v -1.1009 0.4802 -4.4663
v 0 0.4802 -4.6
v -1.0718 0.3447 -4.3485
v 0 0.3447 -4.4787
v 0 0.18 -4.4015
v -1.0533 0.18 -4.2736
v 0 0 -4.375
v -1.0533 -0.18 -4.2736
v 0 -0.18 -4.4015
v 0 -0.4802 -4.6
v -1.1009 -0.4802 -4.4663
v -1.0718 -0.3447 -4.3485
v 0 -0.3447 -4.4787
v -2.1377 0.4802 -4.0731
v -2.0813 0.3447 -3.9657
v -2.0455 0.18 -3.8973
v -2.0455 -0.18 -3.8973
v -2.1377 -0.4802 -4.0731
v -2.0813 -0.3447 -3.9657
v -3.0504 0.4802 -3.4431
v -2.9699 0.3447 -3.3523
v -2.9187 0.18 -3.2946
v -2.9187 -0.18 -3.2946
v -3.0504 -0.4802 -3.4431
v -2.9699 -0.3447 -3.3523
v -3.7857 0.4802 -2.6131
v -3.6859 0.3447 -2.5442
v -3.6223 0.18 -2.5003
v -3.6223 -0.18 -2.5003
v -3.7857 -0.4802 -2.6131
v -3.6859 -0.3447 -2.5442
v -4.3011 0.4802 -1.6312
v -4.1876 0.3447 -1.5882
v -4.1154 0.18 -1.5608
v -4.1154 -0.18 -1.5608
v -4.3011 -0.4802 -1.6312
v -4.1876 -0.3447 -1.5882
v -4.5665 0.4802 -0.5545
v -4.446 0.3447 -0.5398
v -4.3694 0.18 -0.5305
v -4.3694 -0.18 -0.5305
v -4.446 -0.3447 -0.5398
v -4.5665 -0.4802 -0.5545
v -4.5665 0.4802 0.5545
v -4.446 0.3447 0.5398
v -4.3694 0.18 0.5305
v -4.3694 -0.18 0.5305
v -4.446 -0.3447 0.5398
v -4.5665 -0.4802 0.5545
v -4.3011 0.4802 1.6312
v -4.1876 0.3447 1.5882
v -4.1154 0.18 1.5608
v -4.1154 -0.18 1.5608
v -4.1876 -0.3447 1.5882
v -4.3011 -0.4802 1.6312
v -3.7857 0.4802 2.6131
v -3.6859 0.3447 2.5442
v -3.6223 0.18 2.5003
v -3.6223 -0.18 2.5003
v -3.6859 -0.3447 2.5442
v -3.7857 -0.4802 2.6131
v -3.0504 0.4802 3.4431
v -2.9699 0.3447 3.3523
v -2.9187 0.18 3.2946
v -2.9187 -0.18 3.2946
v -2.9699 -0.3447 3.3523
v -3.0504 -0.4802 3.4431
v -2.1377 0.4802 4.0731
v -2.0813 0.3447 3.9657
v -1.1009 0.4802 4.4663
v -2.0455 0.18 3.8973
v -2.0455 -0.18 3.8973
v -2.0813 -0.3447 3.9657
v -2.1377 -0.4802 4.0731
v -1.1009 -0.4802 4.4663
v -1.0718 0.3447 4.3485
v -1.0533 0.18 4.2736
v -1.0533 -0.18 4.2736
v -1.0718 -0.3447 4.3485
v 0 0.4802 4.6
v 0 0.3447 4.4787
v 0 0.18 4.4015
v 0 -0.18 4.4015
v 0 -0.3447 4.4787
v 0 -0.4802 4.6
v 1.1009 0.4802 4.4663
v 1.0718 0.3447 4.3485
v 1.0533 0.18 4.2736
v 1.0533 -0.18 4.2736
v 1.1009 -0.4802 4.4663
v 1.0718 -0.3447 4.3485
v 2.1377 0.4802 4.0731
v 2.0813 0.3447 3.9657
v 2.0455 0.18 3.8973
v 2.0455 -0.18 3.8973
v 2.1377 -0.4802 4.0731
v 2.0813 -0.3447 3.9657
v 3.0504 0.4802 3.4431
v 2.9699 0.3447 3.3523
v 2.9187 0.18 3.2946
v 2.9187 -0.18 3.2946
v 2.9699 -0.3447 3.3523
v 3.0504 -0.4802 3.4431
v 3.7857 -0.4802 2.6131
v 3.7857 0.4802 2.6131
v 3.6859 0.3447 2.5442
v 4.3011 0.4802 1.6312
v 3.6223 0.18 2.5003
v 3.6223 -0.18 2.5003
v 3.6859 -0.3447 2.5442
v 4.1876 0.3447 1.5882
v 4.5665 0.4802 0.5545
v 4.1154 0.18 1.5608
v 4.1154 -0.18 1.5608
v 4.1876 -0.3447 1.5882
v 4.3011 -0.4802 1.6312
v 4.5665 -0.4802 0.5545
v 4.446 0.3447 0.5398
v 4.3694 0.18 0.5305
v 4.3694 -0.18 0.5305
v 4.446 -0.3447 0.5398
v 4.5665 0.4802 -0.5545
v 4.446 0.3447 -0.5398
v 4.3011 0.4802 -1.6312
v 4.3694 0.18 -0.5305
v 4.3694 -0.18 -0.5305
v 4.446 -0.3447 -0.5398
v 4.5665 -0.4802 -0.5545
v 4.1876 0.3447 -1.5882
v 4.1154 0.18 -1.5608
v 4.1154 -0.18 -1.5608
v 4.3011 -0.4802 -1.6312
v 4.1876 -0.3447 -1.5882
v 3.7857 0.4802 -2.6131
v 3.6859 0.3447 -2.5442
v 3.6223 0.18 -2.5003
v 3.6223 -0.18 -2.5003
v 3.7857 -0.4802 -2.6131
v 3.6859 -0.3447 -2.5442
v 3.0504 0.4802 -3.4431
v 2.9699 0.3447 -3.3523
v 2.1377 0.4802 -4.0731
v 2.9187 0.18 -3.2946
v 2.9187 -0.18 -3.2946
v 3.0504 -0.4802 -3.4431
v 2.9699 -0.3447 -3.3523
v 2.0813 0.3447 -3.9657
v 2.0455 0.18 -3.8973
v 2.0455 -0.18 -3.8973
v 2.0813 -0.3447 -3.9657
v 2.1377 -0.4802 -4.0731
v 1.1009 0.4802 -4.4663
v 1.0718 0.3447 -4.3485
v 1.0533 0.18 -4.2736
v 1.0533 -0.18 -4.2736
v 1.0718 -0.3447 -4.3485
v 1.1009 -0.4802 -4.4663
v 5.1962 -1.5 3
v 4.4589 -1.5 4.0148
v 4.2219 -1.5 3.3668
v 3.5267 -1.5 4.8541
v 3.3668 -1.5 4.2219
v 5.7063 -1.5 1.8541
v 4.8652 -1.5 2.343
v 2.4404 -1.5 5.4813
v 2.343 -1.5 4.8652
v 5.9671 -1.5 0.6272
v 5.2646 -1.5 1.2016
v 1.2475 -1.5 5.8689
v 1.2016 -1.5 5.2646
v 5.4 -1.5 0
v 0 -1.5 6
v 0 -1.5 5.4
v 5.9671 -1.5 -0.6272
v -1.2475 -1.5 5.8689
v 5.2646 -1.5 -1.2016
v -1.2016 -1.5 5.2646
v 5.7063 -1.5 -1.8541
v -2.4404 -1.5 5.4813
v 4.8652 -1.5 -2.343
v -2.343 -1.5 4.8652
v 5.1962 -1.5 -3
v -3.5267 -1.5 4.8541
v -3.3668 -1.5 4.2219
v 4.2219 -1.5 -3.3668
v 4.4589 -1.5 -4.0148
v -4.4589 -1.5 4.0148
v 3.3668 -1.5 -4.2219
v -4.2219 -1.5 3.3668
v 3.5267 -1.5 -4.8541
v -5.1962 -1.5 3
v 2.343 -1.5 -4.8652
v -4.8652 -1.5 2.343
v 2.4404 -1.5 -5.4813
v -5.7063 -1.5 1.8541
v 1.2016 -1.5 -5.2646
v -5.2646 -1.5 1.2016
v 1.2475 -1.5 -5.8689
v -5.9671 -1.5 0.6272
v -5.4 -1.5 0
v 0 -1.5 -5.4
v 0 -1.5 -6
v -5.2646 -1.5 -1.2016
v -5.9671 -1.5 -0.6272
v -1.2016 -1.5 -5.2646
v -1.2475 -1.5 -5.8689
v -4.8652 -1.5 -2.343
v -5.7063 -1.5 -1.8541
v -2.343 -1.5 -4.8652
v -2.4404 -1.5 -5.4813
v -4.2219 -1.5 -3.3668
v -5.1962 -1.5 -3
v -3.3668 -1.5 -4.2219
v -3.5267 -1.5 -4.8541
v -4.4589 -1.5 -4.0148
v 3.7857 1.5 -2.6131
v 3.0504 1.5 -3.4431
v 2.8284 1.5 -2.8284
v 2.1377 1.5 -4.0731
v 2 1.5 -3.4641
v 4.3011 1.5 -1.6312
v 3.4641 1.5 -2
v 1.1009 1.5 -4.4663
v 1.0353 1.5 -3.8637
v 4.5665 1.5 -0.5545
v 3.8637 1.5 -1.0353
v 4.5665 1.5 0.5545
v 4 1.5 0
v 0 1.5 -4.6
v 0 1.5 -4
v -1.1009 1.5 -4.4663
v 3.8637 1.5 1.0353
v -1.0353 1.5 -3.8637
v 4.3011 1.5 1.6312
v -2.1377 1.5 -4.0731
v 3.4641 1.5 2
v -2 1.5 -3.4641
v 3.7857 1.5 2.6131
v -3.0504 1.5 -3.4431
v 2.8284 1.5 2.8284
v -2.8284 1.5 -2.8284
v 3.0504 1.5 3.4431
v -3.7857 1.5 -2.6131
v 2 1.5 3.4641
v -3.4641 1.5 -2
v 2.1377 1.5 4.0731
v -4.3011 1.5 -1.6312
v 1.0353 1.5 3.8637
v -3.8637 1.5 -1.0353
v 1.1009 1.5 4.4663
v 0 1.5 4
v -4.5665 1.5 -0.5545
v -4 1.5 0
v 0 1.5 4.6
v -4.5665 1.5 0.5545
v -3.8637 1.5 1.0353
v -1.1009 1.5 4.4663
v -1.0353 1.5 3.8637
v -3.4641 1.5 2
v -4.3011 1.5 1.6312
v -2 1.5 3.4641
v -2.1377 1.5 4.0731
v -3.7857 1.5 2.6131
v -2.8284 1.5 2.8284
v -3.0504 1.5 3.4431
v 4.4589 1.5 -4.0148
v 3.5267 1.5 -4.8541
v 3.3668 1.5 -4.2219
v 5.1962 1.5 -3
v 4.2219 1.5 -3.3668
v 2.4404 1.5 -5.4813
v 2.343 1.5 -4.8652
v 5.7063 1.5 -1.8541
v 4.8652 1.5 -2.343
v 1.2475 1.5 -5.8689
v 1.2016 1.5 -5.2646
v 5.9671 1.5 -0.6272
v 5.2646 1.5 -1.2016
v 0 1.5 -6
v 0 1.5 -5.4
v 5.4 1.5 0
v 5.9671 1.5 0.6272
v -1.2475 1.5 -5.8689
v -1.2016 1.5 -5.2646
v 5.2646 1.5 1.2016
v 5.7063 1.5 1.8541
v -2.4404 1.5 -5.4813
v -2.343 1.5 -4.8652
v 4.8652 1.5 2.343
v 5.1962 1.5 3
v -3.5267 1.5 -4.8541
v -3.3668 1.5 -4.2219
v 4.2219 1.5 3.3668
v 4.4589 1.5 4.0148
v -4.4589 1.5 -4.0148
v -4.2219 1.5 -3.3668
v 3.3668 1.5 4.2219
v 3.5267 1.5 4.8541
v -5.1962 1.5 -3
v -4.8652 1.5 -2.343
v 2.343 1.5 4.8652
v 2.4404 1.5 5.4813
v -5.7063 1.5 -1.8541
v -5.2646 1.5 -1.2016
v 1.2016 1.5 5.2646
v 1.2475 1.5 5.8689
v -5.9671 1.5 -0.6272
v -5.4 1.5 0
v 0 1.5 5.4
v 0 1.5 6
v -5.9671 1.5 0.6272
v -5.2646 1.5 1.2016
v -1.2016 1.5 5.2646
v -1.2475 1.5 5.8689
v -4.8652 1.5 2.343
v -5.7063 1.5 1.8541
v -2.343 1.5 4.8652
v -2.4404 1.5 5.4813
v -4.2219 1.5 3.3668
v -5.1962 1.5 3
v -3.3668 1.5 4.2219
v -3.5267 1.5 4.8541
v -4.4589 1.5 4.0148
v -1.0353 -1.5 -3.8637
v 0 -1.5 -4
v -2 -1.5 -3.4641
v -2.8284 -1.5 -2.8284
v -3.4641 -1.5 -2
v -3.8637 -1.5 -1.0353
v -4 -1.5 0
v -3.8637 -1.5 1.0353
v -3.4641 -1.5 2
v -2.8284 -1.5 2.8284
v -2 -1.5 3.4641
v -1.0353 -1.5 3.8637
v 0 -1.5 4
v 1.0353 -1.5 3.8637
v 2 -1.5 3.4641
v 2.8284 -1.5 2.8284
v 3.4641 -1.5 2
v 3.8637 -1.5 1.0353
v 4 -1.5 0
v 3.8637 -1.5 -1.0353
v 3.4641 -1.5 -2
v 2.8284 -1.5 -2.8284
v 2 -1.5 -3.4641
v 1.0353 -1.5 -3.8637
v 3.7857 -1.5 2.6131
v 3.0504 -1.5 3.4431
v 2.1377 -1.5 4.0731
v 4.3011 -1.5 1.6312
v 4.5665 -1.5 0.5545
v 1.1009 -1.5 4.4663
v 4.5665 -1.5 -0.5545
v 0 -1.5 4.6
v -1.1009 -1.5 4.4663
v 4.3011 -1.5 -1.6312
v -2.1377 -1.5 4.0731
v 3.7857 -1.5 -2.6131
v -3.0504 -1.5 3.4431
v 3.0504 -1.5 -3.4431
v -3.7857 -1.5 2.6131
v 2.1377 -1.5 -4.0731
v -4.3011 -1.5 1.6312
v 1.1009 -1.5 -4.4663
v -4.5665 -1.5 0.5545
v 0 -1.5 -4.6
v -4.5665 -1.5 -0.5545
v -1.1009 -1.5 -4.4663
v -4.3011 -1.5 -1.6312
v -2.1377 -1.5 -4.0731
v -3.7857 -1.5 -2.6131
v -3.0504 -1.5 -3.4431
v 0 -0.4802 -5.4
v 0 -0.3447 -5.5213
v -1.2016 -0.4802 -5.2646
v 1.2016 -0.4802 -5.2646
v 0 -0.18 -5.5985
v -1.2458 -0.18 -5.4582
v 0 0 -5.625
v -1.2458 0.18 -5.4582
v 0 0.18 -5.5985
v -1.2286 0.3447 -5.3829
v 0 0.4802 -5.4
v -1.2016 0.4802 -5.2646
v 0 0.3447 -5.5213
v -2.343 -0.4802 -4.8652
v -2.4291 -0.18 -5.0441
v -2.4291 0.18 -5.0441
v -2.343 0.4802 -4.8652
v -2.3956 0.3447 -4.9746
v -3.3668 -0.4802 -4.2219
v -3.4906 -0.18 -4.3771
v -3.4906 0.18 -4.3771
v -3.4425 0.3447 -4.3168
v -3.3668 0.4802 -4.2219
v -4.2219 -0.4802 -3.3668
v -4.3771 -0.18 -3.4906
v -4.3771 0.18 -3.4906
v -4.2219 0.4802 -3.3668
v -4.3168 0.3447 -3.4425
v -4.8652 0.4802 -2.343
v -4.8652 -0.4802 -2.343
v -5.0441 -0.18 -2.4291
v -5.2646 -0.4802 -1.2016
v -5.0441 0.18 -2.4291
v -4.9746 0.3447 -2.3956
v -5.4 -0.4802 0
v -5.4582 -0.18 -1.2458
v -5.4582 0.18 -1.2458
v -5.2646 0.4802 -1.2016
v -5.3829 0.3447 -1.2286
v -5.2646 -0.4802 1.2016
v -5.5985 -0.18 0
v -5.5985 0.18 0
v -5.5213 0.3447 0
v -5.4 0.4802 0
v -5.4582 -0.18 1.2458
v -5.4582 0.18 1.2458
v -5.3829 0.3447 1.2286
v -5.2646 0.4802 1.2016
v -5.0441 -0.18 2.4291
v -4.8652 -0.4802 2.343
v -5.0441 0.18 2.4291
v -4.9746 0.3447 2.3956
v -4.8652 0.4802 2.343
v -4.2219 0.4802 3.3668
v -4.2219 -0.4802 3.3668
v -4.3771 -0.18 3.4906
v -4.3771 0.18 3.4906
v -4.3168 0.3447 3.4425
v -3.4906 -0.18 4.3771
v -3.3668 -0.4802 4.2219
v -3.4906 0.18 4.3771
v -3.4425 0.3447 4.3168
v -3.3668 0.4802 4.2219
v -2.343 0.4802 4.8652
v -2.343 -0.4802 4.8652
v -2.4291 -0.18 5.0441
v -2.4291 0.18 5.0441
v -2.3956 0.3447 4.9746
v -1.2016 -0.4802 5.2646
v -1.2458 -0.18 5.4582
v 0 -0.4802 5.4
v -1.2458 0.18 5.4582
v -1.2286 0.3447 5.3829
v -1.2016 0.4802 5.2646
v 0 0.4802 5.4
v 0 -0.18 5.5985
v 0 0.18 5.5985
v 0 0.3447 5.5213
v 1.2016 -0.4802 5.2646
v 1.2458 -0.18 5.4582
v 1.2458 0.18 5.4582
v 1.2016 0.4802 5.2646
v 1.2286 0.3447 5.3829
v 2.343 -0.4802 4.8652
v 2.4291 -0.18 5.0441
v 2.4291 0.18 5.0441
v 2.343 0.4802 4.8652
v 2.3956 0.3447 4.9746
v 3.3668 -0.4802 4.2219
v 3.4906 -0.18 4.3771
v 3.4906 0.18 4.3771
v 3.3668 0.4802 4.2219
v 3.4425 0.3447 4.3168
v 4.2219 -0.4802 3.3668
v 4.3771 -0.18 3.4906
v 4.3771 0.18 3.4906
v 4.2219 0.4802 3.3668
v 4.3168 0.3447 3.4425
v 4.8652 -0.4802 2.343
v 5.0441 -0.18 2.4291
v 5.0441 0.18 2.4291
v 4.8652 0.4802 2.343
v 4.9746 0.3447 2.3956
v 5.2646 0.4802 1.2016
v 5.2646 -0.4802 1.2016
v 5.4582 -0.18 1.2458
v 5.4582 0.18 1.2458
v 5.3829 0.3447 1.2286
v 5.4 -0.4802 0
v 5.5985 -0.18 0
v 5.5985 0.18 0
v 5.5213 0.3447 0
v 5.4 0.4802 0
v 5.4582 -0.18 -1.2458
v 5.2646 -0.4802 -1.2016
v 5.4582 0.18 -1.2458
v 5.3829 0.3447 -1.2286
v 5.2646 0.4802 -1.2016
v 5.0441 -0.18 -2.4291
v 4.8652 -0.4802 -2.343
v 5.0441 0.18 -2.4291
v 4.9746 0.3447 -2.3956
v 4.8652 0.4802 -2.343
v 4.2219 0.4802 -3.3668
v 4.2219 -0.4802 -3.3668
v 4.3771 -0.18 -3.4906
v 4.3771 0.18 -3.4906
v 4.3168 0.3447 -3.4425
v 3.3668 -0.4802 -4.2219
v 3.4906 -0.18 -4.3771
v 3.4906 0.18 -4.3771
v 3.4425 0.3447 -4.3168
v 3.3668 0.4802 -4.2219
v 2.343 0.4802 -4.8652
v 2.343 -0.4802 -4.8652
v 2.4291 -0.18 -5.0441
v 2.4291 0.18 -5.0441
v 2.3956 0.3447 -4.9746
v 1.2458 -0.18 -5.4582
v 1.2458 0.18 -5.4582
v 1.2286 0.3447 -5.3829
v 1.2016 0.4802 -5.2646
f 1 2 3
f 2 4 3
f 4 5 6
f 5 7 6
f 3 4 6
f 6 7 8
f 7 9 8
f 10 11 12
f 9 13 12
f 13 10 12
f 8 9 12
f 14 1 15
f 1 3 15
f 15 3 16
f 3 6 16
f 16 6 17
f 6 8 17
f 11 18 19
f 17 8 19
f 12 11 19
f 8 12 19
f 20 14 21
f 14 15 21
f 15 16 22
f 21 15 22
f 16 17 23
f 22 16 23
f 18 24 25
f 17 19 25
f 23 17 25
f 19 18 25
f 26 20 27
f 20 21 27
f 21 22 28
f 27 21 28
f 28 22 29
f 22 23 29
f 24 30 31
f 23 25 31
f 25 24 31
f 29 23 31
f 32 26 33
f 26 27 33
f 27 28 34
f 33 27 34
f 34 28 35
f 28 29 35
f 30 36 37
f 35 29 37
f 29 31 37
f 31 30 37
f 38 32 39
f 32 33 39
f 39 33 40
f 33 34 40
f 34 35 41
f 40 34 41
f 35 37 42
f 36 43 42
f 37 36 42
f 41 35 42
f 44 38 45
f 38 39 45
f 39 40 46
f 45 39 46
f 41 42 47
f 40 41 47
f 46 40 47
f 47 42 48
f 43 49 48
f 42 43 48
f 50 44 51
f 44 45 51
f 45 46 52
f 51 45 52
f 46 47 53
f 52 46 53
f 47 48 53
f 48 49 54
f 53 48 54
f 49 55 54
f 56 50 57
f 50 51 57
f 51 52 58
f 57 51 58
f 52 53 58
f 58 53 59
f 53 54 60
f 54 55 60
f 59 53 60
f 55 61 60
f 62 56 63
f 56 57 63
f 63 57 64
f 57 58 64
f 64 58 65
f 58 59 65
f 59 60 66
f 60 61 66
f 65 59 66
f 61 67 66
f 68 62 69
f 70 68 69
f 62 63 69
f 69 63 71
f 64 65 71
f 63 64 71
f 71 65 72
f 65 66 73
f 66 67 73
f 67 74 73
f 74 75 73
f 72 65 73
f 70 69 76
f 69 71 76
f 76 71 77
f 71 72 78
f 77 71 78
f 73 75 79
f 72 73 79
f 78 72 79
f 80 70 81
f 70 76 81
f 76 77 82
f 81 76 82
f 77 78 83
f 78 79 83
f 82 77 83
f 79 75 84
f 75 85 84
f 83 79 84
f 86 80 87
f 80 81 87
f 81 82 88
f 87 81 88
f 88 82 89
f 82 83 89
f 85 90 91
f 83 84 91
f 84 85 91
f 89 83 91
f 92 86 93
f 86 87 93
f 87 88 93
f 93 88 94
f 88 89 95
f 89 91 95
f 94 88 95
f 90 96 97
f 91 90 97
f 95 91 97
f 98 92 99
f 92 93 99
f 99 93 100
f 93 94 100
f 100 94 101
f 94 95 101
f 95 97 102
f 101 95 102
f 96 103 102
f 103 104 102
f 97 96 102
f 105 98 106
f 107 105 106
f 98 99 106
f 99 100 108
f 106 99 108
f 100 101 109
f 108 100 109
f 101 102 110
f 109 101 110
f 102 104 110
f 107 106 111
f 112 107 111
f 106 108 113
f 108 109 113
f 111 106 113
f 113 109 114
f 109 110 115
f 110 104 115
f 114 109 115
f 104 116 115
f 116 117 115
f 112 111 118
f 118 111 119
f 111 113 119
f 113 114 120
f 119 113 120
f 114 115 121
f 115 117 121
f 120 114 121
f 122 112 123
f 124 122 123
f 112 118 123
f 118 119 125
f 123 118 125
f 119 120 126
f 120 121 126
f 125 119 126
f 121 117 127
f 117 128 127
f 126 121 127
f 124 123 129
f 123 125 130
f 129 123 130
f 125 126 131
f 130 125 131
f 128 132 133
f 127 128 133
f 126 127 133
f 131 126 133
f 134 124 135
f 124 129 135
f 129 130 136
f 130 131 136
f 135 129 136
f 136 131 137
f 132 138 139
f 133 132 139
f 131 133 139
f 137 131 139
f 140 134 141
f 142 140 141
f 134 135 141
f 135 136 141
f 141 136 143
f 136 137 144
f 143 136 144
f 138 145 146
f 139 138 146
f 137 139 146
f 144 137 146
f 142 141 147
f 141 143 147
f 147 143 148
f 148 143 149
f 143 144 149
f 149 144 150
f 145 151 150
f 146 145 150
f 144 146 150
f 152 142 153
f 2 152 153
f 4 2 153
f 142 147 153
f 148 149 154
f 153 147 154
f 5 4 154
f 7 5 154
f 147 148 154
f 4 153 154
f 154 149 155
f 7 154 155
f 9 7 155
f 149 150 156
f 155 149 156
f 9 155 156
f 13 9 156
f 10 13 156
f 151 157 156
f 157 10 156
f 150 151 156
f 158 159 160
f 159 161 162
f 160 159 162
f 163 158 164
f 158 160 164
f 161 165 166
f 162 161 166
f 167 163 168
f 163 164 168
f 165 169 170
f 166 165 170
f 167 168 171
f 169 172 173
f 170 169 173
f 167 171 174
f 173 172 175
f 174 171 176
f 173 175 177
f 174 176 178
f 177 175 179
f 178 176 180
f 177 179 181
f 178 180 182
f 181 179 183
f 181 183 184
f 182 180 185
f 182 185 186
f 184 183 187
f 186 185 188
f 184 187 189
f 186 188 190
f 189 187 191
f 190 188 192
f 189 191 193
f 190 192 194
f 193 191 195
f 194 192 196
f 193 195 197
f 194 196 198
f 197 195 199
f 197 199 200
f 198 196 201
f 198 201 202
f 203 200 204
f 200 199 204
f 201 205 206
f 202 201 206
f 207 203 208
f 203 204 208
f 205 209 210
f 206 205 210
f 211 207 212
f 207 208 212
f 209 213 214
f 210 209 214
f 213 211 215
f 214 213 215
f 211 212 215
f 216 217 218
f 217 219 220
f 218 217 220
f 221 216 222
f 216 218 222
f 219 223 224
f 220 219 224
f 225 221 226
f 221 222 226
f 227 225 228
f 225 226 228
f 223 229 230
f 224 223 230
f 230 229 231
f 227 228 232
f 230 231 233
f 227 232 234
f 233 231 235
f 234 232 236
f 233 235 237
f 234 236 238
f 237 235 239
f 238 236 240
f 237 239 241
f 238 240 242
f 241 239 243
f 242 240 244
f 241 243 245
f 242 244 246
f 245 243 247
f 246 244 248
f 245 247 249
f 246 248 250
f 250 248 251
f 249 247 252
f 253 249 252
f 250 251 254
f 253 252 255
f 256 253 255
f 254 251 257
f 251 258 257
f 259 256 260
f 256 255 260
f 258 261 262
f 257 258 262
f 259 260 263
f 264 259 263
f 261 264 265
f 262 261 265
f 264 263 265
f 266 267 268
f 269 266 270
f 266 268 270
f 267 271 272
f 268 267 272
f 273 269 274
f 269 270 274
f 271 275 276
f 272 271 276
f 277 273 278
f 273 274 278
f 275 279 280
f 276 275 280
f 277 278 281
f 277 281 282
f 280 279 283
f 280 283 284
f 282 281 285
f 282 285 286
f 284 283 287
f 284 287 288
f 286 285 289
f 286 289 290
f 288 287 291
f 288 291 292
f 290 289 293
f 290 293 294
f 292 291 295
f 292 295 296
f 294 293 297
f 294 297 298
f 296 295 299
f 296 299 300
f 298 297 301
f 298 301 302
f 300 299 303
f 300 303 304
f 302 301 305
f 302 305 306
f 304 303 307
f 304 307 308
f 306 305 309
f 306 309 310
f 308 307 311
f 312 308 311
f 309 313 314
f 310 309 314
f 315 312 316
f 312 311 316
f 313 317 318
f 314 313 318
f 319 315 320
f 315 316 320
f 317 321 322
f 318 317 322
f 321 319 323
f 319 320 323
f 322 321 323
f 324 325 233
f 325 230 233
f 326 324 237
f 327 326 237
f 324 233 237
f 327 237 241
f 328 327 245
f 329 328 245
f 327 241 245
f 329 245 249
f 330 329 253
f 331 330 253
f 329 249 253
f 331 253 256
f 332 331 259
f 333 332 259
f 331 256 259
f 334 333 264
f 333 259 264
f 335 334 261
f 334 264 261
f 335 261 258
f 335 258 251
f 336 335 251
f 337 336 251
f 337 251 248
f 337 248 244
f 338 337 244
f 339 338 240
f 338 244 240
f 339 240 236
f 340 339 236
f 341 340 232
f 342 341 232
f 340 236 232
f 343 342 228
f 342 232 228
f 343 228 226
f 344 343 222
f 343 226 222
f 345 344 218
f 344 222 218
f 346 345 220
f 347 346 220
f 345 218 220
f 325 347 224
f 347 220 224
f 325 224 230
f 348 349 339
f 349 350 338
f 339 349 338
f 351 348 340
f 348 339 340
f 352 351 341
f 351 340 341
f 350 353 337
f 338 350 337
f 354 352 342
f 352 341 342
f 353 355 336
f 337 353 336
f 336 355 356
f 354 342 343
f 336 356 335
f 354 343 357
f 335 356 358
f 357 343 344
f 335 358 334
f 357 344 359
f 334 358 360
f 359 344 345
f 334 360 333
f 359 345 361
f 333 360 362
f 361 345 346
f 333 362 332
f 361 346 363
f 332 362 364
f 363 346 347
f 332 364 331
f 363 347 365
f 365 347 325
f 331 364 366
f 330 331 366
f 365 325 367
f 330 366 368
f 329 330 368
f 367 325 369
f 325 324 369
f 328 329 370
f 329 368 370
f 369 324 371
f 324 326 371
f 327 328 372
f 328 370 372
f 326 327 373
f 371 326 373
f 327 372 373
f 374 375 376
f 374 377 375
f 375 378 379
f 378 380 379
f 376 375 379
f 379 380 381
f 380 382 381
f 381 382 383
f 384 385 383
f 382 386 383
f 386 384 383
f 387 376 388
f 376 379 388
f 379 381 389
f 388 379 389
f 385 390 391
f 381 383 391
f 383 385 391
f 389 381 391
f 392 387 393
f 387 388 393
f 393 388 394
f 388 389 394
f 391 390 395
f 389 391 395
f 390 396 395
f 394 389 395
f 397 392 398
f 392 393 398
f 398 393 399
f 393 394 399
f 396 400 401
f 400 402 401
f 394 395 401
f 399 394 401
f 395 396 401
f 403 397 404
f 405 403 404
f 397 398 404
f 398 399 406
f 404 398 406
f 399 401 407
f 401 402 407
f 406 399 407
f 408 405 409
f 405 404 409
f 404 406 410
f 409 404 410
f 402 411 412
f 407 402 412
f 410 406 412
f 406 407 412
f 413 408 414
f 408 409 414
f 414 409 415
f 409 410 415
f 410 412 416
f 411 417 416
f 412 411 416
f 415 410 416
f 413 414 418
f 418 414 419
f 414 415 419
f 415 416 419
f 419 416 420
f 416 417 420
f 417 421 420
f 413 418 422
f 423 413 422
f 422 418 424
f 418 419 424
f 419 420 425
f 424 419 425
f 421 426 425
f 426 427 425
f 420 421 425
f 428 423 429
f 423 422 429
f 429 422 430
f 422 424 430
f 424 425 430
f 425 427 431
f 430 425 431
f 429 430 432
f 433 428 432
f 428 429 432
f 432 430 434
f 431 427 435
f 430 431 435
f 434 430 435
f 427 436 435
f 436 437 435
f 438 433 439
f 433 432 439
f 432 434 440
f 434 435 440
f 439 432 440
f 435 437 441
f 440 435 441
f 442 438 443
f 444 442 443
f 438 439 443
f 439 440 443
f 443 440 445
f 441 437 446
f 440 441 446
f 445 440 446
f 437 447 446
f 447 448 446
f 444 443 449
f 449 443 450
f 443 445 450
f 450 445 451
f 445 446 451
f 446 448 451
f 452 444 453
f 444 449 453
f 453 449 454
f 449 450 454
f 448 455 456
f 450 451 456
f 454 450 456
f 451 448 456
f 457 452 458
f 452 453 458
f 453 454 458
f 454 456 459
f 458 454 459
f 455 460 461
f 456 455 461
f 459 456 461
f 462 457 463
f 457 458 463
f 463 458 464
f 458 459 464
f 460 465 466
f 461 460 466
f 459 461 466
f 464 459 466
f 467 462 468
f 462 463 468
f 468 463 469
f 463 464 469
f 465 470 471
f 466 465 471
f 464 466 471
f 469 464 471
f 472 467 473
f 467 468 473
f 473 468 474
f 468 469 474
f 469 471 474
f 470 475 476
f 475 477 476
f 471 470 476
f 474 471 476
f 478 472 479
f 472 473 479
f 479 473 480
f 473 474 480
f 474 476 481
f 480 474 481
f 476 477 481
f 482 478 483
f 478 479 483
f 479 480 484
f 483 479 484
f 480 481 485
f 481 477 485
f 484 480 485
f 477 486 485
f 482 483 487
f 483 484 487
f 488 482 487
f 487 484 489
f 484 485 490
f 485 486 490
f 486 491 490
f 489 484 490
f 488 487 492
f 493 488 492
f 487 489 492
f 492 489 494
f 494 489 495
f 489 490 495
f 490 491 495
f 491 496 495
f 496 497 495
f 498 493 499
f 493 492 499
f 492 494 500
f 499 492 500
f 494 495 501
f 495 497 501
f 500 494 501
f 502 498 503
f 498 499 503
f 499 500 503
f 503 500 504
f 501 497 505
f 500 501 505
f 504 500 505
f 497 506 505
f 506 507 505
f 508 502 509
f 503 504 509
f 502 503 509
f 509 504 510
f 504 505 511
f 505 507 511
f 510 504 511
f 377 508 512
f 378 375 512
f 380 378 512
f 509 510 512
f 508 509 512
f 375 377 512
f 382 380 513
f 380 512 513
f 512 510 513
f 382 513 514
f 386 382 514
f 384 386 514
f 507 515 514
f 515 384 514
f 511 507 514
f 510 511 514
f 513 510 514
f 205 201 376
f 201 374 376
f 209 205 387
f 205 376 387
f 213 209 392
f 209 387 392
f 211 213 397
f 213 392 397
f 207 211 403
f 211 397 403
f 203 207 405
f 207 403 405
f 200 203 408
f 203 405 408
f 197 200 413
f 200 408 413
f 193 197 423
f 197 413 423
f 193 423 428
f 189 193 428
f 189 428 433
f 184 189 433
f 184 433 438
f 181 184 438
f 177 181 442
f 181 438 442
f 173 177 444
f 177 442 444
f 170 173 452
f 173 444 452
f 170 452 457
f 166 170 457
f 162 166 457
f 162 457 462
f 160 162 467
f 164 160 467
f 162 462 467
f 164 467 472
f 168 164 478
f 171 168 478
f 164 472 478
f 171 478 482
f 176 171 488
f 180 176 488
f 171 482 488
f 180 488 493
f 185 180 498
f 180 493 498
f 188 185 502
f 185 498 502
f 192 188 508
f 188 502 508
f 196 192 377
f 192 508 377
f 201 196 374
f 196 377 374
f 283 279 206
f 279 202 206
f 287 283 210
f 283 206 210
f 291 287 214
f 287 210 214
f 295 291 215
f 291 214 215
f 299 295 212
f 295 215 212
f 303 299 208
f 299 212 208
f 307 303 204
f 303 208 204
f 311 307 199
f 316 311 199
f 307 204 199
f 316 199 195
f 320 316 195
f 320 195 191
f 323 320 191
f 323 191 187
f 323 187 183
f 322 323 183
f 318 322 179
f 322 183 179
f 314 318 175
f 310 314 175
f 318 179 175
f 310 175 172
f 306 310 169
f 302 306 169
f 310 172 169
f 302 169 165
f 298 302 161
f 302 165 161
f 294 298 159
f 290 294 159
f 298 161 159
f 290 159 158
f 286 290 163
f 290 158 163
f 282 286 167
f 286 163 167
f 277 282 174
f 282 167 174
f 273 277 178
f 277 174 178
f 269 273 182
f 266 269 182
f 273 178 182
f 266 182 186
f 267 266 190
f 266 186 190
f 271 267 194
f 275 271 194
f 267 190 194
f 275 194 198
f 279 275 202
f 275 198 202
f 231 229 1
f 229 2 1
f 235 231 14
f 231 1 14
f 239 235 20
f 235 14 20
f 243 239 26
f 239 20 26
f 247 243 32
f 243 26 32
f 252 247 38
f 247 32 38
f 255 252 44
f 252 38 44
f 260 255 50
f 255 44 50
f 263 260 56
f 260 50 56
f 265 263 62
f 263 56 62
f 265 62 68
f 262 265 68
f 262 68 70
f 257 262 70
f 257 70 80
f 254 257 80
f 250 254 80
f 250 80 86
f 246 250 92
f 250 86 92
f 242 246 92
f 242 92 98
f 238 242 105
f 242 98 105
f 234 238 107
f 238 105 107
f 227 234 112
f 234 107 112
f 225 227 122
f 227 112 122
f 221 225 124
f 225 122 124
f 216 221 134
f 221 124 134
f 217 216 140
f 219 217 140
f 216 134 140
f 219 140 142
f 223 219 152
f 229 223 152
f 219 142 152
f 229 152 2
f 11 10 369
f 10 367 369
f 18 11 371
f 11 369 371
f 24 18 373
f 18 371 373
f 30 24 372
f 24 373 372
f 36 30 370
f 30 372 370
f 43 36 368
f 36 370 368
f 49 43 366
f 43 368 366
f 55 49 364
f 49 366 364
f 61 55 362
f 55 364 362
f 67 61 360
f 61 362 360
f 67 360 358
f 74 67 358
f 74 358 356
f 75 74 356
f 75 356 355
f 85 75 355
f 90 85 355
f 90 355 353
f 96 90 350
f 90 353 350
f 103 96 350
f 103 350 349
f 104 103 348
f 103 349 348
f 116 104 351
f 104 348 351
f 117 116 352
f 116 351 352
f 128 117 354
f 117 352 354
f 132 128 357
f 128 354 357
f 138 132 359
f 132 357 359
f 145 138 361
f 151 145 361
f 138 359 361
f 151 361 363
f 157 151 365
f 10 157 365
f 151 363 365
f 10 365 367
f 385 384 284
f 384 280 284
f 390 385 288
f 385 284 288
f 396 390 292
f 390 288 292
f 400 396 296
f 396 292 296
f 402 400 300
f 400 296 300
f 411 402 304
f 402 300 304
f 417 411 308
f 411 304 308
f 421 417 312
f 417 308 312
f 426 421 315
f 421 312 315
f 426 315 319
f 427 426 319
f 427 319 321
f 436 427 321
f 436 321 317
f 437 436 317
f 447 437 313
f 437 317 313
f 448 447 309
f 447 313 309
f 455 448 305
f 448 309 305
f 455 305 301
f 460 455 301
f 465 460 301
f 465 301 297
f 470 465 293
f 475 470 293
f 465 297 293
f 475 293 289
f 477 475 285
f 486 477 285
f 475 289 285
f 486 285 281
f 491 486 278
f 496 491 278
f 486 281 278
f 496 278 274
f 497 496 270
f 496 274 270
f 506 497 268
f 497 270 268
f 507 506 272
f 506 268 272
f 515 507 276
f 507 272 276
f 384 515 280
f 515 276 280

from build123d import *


with BuildPart() as part:
    # 草图1 → 旋转1 (revolve)
    with BuildSketch(Plane.XY, mode=Mode.PRIVATE) as revolve_1_sk:
        with BuildLine():
            Line((4, 1.5), (4.6, 1.5))
            Line((4.6, 1.5), (4.6, 0.480234318))
            ThreePointArc((4.6, 0.480234318), (4.375, 0), (4.6, -0.480234318))
            Line((4.6, -0.480234318), (4.6, -1.5))
            Line((4.6, -1.5), (4, -1.5))
            Line((4, -1.5), (4, 1.5))
        make_face()
        with BuildLine():
            Line((6, 1.5), (6, -1.5))
            Line((6, -1.5), (5.4, -1.5))
            Line((5.4, -1.5), (5.4, -0.480234318))
            ThreePointArc((5.4, -0.480234318), (5.625, 0), (5.4, 0.480234318))
            Line((5.4, 0.480234318), (5.4, 1.5))
            Line((5.4, 1.5), (6, 1.5))
        make_face()
    revolve(revolve_1_sk.sketch.rotate(Axis((0, -7.416987478, 0), (0, 1, 0)), 90), axis=Axis((0, -7.416987478, 0), (0, 1, 0)))


solid = part.part
